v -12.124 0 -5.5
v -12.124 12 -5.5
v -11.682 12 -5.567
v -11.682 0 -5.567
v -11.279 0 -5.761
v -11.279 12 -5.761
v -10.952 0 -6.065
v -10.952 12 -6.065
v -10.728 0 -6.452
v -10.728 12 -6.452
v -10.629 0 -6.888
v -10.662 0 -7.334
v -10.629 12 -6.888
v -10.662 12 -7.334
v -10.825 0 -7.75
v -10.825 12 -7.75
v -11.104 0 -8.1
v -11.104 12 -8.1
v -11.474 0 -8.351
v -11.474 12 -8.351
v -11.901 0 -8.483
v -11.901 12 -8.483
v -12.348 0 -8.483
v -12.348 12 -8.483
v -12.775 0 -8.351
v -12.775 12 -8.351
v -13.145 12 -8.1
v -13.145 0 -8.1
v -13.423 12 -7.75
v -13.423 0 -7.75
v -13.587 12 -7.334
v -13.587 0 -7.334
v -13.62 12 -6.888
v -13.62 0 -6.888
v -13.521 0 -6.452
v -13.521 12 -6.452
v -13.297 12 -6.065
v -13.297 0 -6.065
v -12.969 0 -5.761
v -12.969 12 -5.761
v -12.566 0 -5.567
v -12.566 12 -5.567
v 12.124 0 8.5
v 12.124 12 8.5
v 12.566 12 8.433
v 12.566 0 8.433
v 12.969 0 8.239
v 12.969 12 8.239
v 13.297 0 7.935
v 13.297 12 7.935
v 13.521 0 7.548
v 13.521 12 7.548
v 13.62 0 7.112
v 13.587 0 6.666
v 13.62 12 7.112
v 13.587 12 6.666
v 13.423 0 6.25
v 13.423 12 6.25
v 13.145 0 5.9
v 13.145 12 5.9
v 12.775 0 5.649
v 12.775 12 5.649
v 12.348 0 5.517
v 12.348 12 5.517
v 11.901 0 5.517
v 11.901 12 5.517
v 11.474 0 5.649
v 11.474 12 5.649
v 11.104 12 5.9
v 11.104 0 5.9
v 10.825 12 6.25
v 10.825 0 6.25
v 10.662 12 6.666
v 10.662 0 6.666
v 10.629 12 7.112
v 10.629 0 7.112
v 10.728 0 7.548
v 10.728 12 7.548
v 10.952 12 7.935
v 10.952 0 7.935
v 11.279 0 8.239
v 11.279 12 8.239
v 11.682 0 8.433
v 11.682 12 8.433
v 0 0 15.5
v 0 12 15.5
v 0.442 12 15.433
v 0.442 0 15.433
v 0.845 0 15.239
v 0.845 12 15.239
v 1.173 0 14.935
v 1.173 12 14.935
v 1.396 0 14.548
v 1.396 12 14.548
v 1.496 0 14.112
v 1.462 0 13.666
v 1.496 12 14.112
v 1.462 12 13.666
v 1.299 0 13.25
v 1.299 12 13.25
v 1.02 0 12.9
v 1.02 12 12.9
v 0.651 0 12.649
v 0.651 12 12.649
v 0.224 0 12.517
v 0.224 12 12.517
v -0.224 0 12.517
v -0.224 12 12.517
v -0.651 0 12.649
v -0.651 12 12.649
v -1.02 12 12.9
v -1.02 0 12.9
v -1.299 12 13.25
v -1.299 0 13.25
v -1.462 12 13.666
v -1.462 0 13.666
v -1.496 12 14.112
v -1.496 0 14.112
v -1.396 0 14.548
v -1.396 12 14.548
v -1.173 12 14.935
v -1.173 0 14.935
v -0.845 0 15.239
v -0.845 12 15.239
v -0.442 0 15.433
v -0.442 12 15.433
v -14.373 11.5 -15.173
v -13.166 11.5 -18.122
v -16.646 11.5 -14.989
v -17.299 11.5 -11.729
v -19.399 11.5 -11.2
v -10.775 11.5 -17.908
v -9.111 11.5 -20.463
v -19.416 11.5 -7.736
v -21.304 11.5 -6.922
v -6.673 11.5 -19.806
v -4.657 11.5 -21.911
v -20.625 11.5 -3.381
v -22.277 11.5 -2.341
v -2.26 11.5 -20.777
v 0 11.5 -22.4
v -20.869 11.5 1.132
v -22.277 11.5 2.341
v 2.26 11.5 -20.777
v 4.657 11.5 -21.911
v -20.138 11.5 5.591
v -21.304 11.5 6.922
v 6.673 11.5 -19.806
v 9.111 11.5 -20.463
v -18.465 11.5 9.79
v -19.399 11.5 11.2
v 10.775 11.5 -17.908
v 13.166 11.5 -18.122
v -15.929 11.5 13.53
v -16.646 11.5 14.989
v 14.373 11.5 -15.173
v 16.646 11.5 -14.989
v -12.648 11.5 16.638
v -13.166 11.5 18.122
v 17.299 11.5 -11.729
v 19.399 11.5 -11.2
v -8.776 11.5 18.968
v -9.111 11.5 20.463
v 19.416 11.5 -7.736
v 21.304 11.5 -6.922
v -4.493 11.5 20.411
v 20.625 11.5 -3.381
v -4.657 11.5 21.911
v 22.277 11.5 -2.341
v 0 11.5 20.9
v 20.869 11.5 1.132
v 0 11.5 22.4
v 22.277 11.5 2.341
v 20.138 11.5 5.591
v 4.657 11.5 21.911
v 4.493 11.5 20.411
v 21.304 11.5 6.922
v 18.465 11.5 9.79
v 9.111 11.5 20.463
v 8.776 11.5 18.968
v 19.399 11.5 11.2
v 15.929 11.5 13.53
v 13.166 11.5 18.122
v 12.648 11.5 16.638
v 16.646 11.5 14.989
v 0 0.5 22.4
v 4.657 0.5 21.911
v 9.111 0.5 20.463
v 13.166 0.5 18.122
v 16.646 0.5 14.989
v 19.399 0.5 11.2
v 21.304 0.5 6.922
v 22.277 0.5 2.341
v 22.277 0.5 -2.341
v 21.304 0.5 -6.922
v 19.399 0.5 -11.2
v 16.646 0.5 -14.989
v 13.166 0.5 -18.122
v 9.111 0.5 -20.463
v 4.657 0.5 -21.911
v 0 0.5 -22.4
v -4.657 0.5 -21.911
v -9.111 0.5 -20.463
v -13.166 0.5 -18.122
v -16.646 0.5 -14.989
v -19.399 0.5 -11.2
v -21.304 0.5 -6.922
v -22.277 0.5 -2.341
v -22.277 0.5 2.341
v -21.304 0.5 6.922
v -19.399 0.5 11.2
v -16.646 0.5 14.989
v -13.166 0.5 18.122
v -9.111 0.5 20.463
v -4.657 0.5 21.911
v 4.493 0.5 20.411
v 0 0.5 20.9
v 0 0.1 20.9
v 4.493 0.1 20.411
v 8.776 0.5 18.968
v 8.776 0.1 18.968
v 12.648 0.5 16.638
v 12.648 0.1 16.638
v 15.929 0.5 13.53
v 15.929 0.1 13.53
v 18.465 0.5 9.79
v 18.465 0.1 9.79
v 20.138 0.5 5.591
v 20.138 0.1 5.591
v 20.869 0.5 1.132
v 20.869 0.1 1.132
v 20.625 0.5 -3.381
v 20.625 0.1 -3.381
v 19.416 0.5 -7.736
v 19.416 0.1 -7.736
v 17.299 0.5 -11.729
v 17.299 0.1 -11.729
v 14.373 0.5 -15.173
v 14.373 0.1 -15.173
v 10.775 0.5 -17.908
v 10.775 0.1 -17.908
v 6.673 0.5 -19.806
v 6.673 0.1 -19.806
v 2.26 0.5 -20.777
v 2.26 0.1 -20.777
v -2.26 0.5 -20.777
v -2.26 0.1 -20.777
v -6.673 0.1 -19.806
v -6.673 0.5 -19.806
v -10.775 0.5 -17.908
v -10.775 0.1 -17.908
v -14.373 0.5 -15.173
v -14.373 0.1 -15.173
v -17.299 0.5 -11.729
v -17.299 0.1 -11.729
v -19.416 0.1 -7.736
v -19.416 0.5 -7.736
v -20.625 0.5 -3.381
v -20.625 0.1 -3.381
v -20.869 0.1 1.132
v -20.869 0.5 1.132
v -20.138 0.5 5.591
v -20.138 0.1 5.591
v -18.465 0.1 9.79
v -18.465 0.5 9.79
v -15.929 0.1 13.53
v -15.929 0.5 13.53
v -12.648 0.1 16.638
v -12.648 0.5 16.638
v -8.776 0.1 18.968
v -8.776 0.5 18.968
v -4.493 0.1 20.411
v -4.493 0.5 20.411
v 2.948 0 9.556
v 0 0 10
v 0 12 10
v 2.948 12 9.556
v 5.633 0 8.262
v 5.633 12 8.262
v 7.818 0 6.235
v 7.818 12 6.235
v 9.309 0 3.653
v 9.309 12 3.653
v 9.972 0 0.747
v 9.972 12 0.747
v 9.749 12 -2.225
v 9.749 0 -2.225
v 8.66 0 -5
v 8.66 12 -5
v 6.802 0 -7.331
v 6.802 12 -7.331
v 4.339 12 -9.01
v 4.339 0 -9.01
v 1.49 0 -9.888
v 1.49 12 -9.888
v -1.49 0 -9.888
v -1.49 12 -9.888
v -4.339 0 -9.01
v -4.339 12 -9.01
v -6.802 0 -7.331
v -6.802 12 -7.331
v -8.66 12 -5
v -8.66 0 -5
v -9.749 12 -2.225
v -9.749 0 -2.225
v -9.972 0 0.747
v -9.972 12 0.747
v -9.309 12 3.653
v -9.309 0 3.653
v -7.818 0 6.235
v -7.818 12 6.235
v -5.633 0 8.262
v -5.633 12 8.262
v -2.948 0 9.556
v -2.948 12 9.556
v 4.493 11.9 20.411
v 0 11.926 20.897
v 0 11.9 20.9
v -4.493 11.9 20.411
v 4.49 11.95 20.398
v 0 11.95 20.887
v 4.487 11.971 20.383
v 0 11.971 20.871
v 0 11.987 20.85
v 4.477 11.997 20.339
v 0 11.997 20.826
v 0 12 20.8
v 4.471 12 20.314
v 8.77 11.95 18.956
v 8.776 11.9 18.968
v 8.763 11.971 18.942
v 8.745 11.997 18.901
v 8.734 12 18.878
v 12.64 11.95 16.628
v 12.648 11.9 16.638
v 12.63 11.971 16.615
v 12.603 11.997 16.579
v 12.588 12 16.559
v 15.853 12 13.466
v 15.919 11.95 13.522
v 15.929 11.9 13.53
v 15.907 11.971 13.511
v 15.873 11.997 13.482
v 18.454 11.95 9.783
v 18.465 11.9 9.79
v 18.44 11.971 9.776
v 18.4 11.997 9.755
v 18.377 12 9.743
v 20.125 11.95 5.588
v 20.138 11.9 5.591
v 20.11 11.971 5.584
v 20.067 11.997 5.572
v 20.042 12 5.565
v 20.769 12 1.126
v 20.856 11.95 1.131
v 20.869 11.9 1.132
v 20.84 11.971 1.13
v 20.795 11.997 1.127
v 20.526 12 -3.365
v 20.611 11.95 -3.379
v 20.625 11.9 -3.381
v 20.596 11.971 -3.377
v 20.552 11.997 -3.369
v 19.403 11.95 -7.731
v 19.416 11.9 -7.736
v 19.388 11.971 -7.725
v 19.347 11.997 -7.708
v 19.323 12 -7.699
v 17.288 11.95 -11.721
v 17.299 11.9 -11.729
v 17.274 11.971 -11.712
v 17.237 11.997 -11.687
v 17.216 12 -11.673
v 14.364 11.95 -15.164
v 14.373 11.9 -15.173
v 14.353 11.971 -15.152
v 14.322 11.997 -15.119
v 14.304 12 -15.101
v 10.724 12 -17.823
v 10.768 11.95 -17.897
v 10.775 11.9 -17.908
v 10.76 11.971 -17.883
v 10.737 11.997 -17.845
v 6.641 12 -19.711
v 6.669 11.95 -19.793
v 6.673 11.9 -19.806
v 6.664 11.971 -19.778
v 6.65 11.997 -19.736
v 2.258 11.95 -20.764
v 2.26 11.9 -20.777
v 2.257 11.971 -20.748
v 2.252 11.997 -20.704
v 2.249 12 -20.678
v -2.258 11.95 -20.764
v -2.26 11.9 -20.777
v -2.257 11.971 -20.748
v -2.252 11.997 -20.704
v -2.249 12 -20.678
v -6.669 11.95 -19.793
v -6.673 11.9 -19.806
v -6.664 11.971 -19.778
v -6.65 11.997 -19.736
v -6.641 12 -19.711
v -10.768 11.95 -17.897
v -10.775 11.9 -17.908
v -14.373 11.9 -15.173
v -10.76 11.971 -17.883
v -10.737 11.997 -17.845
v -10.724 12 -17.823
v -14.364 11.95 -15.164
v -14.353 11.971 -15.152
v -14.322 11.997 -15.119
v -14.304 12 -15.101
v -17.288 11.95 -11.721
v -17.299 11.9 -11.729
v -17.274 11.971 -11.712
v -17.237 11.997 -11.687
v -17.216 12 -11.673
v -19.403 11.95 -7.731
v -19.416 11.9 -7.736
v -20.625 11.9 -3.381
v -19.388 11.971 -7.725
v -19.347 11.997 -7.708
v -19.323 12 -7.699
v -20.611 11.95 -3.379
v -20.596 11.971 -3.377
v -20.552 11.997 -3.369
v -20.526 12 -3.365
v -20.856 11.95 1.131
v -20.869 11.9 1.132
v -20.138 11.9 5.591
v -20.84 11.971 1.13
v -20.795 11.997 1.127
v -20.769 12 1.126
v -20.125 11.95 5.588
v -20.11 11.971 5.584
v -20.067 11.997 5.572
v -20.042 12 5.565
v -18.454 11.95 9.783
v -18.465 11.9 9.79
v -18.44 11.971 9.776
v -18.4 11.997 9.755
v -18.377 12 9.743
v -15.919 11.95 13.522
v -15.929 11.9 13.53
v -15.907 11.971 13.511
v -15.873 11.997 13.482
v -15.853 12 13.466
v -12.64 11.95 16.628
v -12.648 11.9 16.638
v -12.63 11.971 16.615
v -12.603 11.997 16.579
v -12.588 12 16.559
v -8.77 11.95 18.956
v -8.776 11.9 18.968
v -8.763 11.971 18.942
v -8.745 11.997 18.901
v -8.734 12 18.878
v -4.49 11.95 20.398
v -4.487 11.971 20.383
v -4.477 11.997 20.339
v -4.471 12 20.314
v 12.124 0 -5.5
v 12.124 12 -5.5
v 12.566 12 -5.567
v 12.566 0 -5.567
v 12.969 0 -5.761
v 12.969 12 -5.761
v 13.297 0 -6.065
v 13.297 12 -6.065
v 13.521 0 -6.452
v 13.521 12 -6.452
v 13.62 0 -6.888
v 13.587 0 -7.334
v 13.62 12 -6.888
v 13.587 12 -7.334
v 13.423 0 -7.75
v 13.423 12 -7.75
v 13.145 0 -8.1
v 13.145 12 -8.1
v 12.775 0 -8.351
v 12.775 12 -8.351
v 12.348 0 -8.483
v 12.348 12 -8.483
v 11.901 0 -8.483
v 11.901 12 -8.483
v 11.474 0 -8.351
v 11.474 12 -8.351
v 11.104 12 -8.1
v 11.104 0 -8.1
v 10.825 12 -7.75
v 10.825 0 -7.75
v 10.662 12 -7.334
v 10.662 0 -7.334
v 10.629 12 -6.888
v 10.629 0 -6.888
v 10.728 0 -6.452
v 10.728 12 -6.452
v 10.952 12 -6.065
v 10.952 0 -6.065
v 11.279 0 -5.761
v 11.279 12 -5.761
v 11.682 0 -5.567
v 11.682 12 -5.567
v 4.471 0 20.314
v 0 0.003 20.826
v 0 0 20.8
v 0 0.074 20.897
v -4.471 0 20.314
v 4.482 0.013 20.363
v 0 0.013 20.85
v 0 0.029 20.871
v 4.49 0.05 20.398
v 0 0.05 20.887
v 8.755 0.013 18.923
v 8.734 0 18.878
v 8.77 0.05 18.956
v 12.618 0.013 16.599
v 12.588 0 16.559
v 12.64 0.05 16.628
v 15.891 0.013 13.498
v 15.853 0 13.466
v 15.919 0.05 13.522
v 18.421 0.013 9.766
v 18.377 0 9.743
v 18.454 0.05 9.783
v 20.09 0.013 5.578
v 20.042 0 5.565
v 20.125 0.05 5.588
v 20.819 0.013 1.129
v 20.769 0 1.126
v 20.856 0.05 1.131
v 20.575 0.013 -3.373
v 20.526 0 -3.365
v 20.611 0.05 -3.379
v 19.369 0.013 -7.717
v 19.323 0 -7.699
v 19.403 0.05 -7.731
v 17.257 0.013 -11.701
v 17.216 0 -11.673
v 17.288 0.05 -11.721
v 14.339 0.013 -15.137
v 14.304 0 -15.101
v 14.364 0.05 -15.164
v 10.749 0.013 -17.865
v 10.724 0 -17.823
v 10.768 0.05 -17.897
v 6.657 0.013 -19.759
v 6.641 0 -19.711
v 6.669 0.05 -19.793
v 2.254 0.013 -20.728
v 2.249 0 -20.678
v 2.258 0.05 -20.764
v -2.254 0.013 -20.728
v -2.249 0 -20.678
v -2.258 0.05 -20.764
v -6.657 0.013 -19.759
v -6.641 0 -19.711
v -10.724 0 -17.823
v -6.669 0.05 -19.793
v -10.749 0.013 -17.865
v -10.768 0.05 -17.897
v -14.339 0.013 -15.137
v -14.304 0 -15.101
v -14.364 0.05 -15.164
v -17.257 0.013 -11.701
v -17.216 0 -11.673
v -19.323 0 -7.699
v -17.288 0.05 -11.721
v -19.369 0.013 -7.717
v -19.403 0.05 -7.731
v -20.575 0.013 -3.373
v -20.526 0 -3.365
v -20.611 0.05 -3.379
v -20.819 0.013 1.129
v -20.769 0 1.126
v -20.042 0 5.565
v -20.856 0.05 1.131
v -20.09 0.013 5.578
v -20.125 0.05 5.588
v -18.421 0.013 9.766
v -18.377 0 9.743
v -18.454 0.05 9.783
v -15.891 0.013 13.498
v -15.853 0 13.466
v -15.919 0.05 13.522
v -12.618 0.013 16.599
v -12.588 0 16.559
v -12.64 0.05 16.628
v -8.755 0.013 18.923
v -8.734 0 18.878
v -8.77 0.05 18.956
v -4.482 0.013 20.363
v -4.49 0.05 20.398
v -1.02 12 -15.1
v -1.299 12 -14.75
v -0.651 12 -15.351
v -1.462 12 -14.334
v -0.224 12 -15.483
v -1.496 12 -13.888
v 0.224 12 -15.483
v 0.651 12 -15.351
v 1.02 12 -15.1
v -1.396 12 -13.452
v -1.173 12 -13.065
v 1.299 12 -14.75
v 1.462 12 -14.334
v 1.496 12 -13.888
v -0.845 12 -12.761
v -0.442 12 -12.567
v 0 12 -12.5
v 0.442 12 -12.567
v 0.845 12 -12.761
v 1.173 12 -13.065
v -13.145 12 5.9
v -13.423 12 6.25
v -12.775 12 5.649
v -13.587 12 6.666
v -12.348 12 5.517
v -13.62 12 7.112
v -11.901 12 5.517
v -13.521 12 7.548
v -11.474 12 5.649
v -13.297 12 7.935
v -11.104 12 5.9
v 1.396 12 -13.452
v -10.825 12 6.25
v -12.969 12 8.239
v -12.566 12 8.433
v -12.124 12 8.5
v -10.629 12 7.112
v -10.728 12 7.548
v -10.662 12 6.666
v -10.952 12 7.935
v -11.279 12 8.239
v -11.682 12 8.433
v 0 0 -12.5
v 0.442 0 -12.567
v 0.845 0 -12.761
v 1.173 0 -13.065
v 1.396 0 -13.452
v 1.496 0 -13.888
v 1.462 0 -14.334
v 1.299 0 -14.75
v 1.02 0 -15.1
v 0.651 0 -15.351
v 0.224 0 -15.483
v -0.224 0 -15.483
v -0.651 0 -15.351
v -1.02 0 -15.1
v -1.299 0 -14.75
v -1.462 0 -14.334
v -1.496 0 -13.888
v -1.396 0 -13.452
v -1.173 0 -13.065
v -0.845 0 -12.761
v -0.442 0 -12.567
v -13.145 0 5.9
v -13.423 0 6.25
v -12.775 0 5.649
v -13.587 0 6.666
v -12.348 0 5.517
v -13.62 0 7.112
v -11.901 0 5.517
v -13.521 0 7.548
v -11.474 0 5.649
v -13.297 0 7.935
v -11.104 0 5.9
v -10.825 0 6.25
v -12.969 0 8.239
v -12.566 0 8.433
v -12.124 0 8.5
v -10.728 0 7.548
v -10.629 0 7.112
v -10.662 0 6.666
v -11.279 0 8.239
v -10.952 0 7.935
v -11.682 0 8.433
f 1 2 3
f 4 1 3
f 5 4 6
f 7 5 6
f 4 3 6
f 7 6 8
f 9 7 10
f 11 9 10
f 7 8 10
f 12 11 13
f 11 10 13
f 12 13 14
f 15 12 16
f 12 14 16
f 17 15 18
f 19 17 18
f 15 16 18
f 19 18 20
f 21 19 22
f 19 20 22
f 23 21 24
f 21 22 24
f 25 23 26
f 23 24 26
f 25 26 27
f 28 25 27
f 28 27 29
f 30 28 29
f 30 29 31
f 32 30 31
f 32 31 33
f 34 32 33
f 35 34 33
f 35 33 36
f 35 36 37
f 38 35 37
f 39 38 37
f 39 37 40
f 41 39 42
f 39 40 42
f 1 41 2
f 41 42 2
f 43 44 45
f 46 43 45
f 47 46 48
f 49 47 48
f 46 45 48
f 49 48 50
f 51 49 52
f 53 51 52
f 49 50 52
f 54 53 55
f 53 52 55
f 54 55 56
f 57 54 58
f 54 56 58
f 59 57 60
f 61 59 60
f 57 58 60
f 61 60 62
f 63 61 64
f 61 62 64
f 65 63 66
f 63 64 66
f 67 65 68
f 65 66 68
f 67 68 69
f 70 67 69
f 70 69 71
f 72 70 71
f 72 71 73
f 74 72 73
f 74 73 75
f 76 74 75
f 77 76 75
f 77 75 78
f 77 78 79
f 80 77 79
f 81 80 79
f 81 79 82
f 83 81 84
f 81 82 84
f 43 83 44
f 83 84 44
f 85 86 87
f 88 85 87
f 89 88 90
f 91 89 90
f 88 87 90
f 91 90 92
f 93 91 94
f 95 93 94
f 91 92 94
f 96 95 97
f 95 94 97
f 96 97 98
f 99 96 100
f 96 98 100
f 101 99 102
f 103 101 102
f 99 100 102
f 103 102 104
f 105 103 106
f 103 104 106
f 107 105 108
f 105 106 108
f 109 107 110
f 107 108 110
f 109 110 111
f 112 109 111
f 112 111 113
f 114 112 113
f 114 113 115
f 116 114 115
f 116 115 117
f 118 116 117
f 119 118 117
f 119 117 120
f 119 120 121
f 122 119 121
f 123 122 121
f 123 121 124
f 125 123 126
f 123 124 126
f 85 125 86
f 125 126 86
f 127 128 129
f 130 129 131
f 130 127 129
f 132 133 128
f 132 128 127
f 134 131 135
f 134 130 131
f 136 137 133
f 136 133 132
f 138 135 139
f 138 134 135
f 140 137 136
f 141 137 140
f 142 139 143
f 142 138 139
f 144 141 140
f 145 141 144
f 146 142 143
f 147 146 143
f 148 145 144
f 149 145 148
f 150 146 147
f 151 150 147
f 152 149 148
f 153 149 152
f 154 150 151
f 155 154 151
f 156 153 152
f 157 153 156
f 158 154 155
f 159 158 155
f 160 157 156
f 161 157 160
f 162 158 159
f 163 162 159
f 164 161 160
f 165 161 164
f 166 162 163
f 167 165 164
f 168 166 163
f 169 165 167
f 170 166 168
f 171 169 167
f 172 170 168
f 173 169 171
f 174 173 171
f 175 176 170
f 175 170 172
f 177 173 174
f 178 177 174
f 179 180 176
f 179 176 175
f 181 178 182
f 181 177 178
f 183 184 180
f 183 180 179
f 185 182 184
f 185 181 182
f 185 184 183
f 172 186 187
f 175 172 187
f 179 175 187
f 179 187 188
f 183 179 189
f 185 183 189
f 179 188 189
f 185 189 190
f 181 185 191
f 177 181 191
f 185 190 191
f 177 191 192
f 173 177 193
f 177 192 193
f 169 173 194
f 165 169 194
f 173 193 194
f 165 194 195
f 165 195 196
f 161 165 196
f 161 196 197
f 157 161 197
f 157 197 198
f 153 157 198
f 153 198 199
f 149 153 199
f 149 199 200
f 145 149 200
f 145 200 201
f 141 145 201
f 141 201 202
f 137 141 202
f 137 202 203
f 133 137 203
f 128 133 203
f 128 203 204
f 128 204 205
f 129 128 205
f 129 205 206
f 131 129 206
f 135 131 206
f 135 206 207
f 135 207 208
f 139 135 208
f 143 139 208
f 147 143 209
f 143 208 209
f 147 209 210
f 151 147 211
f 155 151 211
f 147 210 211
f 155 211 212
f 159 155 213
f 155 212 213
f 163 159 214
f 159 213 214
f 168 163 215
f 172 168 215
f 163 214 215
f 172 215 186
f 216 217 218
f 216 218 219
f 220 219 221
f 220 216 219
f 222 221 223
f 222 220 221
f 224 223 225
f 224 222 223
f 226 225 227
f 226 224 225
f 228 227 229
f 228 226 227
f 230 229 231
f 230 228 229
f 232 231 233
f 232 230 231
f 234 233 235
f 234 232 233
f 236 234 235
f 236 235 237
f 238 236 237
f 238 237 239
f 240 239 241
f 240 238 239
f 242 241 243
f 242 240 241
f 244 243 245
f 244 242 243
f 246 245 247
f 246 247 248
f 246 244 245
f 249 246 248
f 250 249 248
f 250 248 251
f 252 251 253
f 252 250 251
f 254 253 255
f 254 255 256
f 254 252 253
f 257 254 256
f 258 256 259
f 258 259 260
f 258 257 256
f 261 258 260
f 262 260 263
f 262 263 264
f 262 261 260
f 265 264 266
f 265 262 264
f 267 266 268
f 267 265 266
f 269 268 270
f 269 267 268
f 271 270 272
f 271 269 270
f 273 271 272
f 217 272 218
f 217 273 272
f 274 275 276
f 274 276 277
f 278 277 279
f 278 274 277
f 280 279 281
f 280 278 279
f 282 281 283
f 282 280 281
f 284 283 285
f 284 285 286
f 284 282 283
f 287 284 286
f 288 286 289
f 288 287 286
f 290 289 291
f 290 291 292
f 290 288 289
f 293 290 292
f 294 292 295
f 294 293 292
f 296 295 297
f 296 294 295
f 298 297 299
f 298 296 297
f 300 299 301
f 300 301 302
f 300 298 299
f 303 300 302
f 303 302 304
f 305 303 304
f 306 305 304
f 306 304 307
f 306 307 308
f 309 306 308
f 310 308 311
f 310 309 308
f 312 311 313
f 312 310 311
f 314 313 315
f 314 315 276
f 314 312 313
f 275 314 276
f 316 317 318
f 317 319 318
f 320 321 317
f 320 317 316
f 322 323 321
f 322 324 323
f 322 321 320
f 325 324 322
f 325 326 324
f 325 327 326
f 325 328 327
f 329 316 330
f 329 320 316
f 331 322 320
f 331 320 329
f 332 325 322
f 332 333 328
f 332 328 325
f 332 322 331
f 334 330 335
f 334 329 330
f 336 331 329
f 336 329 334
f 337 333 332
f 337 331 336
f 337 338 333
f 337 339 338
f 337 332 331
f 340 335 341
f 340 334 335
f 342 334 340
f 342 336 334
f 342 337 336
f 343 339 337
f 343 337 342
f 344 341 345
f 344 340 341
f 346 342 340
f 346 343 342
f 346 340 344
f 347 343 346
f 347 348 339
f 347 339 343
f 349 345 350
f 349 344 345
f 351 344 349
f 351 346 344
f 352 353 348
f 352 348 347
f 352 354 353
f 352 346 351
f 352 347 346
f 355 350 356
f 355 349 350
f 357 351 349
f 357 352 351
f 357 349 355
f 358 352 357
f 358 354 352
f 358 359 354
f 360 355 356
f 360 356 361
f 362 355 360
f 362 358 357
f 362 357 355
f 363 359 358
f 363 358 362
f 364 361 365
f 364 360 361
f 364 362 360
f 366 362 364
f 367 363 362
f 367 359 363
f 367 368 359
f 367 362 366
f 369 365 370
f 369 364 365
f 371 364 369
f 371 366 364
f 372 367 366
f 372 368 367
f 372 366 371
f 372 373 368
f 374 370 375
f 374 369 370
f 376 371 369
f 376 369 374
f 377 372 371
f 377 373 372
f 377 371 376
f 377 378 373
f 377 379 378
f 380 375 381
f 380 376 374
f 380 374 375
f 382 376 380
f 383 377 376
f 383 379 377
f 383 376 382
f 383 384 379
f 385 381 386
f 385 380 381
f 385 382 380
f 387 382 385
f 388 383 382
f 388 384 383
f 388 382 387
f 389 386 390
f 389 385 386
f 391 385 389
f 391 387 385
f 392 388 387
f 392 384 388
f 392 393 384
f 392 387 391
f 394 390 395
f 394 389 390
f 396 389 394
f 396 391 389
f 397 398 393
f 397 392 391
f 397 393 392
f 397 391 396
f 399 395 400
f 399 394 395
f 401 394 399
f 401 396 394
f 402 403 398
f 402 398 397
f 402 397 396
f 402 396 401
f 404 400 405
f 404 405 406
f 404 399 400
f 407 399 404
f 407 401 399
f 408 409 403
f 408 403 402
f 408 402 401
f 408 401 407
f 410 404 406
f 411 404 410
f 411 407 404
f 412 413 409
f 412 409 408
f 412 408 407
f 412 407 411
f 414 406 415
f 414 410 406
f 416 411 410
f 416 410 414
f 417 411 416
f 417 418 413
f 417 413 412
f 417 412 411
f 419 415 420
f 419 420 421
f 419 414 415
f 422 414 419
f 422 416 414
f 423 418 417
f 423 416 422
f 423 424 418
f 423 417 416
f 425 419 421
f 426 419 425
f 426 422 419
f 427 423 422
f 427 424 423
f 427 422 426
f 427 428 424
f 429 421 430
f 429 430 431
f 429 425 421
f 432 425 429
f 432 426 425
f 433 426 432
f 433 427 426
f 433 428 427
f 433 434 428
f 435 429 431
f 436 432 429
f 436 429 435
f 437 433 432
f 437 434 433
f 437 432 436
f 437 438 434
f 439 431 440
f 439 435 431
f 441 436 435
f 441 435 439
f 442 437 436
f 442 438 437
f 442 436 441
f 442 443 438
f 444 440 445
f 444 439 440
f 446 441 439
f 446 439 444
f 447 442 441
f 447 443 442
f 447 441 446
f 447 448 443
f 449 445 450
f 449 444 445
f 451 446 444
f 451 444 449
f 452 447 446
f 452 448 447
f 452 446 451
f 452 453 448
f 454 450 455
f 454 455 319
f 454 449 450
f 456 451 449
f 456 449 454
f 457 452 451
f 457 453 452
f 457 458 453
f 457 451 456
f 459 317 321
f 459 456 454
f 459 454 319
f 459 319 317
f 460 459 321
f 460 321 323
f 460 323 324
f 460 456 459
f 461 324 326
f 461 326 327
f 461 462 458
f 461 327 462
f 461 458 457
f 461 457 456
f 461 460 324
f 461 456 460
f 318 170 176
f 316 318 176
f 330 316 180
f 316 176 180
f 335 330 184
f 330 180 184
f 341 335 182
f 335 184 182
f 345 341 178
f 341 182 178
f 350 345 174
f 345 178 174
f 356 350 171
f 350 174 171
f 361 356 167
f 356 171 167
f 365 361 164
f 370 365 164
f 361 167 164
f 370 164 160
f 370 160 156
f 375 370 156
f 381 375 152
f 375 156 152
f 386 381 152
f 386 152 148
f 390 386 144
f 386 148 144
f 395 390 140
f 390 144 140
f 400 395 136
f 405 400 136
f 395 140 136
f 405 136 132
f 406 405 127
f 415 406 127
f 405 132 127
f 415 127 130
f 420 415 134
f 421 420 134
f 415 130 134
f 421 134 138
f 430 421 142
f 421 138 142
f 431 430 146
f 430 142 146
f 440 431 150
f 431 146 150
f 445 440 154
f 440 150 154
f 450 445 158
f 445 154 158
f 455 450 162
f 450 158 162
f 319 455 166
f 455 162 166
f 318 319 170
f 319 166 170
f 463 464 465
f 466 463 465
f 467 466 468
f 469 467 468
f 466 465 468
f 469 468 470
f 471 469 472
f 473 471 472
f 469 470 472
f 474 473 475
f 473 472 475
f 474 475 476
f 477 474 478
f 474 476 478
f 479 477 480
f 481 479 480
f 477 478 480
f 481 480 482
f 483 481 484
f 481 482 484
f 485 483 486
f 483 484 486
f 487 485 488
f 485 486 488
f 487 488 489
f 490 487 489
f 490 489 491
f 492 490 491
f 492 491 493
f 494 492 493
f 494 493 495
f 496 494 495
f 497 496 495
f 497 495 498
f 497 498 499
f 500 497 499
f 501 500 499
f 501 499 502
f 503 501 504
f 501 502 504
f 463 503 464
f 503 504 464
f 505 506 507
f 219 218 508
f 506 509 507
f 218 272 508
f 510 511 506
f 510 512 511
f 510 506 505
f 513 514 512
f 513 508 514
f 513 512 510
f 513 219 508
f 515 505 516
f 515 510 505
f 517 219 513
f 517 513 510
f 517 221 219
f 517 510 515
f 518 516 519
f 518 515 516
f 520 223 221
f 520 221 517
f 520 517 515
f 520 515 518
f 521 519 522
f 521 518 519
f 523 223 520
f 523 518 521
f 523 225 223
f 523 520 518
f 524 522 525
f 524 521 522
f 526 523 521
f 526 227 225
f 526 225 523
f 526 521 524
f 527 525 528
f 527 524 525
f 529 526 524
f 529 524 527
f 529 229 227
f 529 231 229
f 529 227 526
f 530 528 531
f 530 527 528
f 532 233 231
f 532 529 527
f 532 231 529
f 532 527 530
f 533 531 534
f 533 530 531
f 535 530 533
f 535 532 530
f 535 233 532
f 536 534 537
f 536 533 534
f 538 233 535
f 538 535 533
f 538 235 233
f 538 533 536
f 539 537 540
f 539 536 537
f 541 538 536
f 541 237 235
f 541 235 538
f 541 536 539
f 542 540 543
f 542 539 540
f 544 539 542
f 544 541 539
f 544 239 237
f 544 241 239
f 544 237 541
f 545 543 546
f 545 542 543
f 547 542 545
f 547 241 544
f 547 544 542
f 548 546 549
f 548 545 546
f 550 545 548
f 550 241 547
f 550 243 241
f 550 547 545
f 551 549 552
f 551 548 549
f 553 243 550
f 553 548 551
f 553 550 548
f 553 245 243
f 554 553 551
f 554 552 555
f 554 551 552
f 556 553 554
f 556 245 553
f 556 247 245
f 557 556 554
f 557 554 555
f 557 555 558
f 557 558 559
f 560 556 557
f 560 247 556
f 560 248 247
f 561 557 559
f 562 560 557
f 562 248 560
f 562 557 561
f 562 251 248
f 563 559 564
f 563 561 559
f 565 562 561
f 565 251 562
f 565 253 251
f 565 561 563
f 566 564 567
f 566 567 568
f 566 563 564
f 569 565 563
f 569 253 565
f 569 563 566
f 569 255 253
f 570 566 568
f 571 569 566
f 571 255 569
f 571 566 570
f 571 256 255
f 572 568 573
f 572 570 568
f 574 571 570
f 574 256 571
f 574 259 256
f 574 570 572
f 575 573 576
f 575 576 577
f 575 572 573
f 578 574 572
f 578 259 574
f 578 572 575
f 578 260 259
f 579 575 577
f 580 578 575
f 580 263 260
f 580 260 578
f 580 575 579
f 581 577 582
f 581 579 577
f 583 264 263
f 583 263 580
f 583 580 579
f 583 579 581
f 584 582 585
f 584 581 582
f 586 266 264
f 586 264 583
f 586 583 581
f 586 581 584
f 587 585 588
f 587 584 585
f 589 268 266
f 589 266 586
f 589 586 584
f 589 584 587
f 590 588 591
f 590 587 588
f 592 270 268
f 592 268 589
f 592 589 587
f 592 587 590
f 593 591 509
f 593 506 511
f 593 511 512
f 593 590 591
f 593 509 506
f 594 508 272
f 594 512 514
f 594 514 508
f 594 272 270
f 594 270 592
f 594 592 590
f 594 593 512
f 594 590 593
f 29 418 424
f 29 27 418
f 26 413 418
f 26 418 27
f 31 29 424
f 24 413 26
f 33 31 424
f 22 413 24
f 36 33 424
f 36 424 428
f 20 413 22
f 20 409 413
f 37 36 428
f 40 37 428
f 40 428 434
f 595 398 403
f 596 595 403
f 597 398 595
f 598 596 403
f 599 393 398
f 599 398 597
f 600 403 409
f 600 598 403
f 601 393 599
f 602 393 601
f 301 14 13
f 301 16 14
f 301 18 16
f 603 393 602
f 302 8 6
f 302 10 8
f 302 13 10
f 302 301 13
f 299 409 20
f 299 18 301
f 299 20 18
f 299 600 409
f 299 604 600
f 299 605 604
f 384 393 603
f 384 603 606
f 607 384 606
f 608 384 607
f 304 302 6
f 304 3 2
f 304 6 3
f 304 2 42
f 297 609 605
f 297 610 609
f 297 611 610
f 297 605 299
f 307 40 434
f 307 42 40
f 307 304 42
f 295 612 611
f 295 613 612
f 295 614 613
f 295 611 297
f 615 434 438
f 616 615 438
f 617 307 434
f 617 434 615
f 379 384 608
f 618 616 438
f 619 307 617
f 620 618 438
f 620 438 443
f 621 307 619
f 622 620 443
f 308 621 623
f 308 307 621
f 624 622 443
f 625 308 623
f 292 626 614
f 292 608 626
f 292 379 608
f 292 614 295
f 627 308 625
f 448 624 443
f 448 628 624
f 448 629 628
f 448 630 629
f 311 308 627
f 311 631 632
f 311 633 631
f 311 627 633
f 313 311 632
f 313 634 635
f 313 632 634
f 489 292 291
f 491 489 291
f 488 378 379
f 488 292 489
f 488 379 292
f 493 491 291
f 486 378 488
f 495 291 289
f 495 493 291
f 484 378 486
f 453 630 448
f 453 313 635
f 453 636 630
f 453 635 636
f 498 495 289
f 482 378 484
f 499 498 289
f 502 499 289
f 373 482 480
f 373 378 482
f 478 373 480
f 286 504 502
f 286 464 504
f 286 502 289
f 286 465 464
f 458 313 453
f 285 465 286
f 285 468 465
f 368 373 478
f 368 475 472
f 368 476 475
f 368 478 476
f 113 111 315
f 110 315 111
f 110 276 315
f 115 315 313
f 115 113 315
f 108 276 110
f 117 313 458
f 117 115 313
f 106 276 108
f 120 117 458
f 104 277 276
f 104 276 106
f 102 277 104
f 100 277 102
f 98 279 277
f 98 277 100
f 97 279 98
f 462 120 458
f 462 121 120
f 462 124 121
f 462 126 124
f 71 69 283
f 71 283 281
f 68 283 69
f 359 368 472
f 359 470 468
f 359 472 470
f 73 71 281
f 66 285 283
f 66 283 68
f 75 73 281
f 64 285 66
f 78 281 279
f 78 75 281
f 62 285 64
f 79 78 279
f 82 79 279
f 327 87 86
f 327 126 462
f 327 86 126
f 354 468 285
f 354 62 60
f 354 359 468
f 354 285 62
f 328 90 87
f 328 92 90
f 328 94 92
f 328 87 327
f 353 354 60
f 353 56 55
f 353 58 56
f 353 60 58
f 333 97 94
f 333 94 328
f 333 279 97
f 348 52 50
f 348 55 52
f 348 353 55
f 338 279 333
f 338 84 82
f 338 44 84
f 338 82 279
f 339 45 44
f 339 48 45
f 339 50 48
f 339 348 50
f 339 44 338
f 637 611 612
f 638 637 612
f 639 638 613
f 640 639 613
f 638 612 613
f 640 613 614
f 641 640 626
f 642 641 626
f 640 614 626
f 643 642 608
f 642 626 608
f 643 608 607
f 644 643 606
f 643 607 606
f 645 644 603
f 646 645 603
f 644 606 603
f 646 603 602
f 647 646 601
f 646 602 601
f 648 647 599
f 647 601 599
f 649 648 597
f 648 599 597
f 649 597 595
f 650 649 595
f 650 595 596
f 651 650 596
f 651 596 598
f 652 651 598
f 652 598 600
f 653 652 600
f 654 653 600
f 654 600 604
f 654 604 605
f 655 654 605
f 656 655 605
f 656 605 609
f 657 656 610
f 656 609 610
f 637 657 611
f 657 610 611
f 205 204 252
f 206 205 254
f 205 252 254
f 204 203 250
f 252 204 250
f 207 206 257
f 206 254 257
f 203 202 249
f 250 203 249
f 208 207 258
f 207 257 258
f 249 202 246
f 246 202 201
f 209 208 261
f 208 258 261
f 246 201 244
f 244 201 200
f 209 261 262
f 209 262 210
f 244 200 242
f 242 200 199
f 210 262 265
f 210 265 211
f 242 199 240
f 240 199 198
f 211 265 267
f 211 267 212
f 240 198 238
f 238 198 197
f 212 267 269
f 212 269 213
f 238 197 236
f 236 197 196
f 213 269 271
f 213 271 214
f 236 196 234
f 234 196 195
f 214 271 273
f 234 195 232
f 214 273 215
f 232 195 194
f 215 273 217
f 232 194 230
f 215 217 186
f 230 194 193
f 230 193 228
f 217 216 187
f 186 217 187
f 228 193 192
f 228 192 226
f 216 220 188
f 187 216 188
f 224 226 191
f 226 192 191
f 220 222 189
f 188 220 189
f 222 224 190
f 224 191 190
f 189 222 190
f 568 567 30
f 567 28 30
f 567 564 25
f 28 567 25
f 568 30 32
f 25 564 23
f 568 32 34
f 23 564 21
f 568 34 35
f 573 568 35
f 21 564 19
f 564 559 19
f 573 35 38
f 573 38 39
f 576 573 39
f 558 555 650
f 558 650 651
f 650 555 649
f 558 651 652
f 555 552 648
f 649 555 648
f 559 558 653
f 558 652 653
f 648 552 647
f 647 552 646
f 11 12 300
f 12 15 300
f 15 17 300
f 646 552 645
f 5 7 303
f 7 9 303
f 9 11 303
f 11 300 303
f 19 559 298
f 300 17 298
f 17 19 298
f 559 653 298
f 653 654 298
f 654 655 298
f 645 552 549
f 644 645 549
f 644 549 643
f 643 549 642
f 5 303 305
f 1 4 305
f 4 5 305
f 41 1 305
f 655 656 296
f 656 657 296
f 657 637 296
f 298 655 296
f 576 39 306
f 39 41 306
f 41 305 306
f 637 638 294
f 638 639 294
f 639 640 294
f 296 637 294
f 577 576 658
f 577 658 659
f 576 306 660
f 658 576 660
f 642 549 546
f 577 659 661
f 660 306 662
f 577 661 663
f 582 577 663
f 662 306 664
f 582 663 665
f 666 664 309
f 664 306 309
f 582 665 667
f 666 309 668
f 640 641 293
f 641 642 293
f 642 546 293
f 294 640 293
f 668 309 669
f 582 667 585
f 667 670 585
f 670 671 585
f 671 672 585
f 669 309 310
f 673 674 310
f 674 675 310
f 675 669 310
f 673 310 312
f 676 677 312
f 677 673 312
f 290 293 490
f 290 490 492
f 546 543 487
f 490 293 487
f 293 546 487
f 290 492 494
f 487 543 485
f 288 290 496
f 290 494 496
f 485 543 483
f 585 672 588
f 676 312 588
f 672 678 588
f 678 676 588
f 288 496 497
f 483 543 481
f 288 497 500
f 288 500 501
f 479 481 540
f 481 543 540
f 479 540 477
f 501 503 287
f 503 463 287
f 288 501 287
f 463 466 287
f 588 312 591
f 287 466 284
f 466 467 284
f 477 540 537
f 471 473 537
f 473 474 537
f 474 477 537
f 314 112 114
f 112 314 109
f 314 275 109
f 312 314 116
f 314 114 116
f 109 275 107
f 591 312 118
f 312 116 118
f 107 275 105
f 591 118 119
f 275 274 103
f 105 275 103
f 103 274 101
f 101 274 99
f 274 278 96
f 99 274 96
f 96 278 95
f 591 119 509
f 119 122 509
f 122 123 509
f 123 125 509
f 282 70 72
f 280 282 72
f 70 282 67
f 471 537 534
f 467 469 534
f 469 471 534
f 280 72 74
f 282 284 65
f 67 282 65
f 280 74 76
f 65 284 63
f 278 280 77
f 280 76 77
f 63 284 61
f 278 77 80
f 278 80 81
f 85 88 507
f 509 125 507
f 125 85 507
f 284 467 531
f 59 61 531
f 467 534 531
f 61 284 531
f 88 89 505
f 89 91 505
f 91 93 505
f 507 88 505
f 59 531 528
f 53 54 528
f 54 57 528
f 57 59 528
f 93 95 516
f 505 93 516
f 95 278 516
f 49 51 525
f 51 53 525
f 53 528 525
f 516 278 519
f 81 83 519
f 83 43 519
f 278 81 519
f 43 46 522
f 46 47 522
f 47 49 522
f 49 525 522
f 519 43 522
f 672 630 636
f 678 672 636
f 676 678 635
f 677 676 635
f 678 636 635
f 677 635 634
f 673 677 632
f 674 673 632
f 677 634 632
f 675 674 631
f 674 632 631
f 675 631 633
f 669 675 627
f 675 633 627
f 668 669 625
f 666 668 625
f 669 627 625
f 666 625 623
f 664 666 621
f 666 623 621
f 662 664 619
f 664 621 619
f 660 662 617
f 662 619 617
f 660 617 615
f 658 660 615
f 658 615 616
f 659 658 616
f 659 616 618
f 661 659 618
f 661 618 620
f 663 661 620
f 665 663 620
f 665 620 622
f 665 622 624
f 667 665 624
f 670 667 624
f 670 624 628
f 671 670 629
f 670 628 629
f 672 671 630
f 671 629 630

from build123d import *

# Parameters (mm, degrees)
SKETCH1_R           = 22.4
SKETCH1_R_2         = 10
BOSS_EXTRUDE1_DEPTH = 12
CUT_EXTRUDE1_START  = -0.5
SKETCH2_R           = 22.4
SKETCH2_R_2         = 20.9
CUT_EXTRUDE1_DEPTH  = 0.5
FILLET1_R           = 0.1
FILLET2_R           = 0.1
SKETCH3_R           = 1.5
CUT_EXTRUDE2_DEPTH  = 12


with BuildPart() as part:
    # Sketch1 → Boss-Extrude1 (new body)
    with BuildSketch(Plane(origin=(0, 0, 0), x_dir=(1, 0, 0), z_dir=(0, 1, 0))):
        with Locations(Location((0, 0, 0), (0, 0, 270))):
            Circle(SKETCH1_R)
        with Locations(Location((0, 0, 0), (0, 0, 270))):
            Circle(SKETCH1_R_2, mode=Mode.SUBTRACT)
    extrude(amount=BOSS_EXTRUDE1_DEPTH)

    # Sketch2 → Cut-Extrude1 (cut)
    with BuildSketch(Plane(origin=(0, 12, 0), x_dir=(1, 0, 0), z_dir=(0, 1, 0)).offset(CUT_EXTRUDE1_START)):
        with Locations(Location((0, 0, 0), (0, 0, 270))):
            Circle(SKETCH2_R)
        with Locations(Location((0, 0, 0), (0, 0, 270))):
            Circle(SKETCH2_R_2, mode=Mode.SUBTRACT)
    cut_extrude1 = extrude(amount=CUT_EXTRUDE1_DEPTH, mode=Mode.SUBTRACT)

    # Fillet1
    fillet1_edges = [part.edges().sort_by_distance(p)[0] for p in [
        (0, 12, -20.9),
    ]]
    fillet(fillet1_edges, radius=FILLET1_R)

    # Mirror3: Cut-Extrude1 across plane
    add(cut_extrude1.mirror(Plane.ZX.offset(6)), mode=Mode.SUBTRACT)

    # Fillet2
    fillet2_edges = [part.edges().sort_by_distance(p)[0] for p in [
        (0, 0, -20.9),
    ]]
    fillet(fillet2_edges, radius=FILLET2_R)

    # Sketch3 → Cut-Extrude2 (cut)
    with BuildSketch(Plane(origin=(0, 12, 0), x_dir=(1, 0, 0), z_dir=(0, 1, 0))):
        with Locations(Location((0, 14, 0), (0, 0, 270))):
            Circle(SKETCH3_R)
        with Locations(Location((12.124355653, 7, 0), (0, 0, 270))):
            Circle(SKETCH3_R)
        with Locations(Location((12.124355653, -7, 0), (0, 0, 270))):
            Circle(SKETCH3_R)
        with Locations(Location((0, -14, 0), (0, 0, 270))):
            Circle(SKETCH3_R)
        with Locations(Location((-12.124355653, -7, 0), (0, 0, 270))):
            Circle(SKETCH3_R)
        with Locations(Location((-12.124355653, 7, 0), (0, 0, 270))):
            Circle(SKETCH3_R)
    extrude(amount=-CUT_EXTRUDE2_DEPTH, mode=Mode.SUBTRACT)


solid = part.part
